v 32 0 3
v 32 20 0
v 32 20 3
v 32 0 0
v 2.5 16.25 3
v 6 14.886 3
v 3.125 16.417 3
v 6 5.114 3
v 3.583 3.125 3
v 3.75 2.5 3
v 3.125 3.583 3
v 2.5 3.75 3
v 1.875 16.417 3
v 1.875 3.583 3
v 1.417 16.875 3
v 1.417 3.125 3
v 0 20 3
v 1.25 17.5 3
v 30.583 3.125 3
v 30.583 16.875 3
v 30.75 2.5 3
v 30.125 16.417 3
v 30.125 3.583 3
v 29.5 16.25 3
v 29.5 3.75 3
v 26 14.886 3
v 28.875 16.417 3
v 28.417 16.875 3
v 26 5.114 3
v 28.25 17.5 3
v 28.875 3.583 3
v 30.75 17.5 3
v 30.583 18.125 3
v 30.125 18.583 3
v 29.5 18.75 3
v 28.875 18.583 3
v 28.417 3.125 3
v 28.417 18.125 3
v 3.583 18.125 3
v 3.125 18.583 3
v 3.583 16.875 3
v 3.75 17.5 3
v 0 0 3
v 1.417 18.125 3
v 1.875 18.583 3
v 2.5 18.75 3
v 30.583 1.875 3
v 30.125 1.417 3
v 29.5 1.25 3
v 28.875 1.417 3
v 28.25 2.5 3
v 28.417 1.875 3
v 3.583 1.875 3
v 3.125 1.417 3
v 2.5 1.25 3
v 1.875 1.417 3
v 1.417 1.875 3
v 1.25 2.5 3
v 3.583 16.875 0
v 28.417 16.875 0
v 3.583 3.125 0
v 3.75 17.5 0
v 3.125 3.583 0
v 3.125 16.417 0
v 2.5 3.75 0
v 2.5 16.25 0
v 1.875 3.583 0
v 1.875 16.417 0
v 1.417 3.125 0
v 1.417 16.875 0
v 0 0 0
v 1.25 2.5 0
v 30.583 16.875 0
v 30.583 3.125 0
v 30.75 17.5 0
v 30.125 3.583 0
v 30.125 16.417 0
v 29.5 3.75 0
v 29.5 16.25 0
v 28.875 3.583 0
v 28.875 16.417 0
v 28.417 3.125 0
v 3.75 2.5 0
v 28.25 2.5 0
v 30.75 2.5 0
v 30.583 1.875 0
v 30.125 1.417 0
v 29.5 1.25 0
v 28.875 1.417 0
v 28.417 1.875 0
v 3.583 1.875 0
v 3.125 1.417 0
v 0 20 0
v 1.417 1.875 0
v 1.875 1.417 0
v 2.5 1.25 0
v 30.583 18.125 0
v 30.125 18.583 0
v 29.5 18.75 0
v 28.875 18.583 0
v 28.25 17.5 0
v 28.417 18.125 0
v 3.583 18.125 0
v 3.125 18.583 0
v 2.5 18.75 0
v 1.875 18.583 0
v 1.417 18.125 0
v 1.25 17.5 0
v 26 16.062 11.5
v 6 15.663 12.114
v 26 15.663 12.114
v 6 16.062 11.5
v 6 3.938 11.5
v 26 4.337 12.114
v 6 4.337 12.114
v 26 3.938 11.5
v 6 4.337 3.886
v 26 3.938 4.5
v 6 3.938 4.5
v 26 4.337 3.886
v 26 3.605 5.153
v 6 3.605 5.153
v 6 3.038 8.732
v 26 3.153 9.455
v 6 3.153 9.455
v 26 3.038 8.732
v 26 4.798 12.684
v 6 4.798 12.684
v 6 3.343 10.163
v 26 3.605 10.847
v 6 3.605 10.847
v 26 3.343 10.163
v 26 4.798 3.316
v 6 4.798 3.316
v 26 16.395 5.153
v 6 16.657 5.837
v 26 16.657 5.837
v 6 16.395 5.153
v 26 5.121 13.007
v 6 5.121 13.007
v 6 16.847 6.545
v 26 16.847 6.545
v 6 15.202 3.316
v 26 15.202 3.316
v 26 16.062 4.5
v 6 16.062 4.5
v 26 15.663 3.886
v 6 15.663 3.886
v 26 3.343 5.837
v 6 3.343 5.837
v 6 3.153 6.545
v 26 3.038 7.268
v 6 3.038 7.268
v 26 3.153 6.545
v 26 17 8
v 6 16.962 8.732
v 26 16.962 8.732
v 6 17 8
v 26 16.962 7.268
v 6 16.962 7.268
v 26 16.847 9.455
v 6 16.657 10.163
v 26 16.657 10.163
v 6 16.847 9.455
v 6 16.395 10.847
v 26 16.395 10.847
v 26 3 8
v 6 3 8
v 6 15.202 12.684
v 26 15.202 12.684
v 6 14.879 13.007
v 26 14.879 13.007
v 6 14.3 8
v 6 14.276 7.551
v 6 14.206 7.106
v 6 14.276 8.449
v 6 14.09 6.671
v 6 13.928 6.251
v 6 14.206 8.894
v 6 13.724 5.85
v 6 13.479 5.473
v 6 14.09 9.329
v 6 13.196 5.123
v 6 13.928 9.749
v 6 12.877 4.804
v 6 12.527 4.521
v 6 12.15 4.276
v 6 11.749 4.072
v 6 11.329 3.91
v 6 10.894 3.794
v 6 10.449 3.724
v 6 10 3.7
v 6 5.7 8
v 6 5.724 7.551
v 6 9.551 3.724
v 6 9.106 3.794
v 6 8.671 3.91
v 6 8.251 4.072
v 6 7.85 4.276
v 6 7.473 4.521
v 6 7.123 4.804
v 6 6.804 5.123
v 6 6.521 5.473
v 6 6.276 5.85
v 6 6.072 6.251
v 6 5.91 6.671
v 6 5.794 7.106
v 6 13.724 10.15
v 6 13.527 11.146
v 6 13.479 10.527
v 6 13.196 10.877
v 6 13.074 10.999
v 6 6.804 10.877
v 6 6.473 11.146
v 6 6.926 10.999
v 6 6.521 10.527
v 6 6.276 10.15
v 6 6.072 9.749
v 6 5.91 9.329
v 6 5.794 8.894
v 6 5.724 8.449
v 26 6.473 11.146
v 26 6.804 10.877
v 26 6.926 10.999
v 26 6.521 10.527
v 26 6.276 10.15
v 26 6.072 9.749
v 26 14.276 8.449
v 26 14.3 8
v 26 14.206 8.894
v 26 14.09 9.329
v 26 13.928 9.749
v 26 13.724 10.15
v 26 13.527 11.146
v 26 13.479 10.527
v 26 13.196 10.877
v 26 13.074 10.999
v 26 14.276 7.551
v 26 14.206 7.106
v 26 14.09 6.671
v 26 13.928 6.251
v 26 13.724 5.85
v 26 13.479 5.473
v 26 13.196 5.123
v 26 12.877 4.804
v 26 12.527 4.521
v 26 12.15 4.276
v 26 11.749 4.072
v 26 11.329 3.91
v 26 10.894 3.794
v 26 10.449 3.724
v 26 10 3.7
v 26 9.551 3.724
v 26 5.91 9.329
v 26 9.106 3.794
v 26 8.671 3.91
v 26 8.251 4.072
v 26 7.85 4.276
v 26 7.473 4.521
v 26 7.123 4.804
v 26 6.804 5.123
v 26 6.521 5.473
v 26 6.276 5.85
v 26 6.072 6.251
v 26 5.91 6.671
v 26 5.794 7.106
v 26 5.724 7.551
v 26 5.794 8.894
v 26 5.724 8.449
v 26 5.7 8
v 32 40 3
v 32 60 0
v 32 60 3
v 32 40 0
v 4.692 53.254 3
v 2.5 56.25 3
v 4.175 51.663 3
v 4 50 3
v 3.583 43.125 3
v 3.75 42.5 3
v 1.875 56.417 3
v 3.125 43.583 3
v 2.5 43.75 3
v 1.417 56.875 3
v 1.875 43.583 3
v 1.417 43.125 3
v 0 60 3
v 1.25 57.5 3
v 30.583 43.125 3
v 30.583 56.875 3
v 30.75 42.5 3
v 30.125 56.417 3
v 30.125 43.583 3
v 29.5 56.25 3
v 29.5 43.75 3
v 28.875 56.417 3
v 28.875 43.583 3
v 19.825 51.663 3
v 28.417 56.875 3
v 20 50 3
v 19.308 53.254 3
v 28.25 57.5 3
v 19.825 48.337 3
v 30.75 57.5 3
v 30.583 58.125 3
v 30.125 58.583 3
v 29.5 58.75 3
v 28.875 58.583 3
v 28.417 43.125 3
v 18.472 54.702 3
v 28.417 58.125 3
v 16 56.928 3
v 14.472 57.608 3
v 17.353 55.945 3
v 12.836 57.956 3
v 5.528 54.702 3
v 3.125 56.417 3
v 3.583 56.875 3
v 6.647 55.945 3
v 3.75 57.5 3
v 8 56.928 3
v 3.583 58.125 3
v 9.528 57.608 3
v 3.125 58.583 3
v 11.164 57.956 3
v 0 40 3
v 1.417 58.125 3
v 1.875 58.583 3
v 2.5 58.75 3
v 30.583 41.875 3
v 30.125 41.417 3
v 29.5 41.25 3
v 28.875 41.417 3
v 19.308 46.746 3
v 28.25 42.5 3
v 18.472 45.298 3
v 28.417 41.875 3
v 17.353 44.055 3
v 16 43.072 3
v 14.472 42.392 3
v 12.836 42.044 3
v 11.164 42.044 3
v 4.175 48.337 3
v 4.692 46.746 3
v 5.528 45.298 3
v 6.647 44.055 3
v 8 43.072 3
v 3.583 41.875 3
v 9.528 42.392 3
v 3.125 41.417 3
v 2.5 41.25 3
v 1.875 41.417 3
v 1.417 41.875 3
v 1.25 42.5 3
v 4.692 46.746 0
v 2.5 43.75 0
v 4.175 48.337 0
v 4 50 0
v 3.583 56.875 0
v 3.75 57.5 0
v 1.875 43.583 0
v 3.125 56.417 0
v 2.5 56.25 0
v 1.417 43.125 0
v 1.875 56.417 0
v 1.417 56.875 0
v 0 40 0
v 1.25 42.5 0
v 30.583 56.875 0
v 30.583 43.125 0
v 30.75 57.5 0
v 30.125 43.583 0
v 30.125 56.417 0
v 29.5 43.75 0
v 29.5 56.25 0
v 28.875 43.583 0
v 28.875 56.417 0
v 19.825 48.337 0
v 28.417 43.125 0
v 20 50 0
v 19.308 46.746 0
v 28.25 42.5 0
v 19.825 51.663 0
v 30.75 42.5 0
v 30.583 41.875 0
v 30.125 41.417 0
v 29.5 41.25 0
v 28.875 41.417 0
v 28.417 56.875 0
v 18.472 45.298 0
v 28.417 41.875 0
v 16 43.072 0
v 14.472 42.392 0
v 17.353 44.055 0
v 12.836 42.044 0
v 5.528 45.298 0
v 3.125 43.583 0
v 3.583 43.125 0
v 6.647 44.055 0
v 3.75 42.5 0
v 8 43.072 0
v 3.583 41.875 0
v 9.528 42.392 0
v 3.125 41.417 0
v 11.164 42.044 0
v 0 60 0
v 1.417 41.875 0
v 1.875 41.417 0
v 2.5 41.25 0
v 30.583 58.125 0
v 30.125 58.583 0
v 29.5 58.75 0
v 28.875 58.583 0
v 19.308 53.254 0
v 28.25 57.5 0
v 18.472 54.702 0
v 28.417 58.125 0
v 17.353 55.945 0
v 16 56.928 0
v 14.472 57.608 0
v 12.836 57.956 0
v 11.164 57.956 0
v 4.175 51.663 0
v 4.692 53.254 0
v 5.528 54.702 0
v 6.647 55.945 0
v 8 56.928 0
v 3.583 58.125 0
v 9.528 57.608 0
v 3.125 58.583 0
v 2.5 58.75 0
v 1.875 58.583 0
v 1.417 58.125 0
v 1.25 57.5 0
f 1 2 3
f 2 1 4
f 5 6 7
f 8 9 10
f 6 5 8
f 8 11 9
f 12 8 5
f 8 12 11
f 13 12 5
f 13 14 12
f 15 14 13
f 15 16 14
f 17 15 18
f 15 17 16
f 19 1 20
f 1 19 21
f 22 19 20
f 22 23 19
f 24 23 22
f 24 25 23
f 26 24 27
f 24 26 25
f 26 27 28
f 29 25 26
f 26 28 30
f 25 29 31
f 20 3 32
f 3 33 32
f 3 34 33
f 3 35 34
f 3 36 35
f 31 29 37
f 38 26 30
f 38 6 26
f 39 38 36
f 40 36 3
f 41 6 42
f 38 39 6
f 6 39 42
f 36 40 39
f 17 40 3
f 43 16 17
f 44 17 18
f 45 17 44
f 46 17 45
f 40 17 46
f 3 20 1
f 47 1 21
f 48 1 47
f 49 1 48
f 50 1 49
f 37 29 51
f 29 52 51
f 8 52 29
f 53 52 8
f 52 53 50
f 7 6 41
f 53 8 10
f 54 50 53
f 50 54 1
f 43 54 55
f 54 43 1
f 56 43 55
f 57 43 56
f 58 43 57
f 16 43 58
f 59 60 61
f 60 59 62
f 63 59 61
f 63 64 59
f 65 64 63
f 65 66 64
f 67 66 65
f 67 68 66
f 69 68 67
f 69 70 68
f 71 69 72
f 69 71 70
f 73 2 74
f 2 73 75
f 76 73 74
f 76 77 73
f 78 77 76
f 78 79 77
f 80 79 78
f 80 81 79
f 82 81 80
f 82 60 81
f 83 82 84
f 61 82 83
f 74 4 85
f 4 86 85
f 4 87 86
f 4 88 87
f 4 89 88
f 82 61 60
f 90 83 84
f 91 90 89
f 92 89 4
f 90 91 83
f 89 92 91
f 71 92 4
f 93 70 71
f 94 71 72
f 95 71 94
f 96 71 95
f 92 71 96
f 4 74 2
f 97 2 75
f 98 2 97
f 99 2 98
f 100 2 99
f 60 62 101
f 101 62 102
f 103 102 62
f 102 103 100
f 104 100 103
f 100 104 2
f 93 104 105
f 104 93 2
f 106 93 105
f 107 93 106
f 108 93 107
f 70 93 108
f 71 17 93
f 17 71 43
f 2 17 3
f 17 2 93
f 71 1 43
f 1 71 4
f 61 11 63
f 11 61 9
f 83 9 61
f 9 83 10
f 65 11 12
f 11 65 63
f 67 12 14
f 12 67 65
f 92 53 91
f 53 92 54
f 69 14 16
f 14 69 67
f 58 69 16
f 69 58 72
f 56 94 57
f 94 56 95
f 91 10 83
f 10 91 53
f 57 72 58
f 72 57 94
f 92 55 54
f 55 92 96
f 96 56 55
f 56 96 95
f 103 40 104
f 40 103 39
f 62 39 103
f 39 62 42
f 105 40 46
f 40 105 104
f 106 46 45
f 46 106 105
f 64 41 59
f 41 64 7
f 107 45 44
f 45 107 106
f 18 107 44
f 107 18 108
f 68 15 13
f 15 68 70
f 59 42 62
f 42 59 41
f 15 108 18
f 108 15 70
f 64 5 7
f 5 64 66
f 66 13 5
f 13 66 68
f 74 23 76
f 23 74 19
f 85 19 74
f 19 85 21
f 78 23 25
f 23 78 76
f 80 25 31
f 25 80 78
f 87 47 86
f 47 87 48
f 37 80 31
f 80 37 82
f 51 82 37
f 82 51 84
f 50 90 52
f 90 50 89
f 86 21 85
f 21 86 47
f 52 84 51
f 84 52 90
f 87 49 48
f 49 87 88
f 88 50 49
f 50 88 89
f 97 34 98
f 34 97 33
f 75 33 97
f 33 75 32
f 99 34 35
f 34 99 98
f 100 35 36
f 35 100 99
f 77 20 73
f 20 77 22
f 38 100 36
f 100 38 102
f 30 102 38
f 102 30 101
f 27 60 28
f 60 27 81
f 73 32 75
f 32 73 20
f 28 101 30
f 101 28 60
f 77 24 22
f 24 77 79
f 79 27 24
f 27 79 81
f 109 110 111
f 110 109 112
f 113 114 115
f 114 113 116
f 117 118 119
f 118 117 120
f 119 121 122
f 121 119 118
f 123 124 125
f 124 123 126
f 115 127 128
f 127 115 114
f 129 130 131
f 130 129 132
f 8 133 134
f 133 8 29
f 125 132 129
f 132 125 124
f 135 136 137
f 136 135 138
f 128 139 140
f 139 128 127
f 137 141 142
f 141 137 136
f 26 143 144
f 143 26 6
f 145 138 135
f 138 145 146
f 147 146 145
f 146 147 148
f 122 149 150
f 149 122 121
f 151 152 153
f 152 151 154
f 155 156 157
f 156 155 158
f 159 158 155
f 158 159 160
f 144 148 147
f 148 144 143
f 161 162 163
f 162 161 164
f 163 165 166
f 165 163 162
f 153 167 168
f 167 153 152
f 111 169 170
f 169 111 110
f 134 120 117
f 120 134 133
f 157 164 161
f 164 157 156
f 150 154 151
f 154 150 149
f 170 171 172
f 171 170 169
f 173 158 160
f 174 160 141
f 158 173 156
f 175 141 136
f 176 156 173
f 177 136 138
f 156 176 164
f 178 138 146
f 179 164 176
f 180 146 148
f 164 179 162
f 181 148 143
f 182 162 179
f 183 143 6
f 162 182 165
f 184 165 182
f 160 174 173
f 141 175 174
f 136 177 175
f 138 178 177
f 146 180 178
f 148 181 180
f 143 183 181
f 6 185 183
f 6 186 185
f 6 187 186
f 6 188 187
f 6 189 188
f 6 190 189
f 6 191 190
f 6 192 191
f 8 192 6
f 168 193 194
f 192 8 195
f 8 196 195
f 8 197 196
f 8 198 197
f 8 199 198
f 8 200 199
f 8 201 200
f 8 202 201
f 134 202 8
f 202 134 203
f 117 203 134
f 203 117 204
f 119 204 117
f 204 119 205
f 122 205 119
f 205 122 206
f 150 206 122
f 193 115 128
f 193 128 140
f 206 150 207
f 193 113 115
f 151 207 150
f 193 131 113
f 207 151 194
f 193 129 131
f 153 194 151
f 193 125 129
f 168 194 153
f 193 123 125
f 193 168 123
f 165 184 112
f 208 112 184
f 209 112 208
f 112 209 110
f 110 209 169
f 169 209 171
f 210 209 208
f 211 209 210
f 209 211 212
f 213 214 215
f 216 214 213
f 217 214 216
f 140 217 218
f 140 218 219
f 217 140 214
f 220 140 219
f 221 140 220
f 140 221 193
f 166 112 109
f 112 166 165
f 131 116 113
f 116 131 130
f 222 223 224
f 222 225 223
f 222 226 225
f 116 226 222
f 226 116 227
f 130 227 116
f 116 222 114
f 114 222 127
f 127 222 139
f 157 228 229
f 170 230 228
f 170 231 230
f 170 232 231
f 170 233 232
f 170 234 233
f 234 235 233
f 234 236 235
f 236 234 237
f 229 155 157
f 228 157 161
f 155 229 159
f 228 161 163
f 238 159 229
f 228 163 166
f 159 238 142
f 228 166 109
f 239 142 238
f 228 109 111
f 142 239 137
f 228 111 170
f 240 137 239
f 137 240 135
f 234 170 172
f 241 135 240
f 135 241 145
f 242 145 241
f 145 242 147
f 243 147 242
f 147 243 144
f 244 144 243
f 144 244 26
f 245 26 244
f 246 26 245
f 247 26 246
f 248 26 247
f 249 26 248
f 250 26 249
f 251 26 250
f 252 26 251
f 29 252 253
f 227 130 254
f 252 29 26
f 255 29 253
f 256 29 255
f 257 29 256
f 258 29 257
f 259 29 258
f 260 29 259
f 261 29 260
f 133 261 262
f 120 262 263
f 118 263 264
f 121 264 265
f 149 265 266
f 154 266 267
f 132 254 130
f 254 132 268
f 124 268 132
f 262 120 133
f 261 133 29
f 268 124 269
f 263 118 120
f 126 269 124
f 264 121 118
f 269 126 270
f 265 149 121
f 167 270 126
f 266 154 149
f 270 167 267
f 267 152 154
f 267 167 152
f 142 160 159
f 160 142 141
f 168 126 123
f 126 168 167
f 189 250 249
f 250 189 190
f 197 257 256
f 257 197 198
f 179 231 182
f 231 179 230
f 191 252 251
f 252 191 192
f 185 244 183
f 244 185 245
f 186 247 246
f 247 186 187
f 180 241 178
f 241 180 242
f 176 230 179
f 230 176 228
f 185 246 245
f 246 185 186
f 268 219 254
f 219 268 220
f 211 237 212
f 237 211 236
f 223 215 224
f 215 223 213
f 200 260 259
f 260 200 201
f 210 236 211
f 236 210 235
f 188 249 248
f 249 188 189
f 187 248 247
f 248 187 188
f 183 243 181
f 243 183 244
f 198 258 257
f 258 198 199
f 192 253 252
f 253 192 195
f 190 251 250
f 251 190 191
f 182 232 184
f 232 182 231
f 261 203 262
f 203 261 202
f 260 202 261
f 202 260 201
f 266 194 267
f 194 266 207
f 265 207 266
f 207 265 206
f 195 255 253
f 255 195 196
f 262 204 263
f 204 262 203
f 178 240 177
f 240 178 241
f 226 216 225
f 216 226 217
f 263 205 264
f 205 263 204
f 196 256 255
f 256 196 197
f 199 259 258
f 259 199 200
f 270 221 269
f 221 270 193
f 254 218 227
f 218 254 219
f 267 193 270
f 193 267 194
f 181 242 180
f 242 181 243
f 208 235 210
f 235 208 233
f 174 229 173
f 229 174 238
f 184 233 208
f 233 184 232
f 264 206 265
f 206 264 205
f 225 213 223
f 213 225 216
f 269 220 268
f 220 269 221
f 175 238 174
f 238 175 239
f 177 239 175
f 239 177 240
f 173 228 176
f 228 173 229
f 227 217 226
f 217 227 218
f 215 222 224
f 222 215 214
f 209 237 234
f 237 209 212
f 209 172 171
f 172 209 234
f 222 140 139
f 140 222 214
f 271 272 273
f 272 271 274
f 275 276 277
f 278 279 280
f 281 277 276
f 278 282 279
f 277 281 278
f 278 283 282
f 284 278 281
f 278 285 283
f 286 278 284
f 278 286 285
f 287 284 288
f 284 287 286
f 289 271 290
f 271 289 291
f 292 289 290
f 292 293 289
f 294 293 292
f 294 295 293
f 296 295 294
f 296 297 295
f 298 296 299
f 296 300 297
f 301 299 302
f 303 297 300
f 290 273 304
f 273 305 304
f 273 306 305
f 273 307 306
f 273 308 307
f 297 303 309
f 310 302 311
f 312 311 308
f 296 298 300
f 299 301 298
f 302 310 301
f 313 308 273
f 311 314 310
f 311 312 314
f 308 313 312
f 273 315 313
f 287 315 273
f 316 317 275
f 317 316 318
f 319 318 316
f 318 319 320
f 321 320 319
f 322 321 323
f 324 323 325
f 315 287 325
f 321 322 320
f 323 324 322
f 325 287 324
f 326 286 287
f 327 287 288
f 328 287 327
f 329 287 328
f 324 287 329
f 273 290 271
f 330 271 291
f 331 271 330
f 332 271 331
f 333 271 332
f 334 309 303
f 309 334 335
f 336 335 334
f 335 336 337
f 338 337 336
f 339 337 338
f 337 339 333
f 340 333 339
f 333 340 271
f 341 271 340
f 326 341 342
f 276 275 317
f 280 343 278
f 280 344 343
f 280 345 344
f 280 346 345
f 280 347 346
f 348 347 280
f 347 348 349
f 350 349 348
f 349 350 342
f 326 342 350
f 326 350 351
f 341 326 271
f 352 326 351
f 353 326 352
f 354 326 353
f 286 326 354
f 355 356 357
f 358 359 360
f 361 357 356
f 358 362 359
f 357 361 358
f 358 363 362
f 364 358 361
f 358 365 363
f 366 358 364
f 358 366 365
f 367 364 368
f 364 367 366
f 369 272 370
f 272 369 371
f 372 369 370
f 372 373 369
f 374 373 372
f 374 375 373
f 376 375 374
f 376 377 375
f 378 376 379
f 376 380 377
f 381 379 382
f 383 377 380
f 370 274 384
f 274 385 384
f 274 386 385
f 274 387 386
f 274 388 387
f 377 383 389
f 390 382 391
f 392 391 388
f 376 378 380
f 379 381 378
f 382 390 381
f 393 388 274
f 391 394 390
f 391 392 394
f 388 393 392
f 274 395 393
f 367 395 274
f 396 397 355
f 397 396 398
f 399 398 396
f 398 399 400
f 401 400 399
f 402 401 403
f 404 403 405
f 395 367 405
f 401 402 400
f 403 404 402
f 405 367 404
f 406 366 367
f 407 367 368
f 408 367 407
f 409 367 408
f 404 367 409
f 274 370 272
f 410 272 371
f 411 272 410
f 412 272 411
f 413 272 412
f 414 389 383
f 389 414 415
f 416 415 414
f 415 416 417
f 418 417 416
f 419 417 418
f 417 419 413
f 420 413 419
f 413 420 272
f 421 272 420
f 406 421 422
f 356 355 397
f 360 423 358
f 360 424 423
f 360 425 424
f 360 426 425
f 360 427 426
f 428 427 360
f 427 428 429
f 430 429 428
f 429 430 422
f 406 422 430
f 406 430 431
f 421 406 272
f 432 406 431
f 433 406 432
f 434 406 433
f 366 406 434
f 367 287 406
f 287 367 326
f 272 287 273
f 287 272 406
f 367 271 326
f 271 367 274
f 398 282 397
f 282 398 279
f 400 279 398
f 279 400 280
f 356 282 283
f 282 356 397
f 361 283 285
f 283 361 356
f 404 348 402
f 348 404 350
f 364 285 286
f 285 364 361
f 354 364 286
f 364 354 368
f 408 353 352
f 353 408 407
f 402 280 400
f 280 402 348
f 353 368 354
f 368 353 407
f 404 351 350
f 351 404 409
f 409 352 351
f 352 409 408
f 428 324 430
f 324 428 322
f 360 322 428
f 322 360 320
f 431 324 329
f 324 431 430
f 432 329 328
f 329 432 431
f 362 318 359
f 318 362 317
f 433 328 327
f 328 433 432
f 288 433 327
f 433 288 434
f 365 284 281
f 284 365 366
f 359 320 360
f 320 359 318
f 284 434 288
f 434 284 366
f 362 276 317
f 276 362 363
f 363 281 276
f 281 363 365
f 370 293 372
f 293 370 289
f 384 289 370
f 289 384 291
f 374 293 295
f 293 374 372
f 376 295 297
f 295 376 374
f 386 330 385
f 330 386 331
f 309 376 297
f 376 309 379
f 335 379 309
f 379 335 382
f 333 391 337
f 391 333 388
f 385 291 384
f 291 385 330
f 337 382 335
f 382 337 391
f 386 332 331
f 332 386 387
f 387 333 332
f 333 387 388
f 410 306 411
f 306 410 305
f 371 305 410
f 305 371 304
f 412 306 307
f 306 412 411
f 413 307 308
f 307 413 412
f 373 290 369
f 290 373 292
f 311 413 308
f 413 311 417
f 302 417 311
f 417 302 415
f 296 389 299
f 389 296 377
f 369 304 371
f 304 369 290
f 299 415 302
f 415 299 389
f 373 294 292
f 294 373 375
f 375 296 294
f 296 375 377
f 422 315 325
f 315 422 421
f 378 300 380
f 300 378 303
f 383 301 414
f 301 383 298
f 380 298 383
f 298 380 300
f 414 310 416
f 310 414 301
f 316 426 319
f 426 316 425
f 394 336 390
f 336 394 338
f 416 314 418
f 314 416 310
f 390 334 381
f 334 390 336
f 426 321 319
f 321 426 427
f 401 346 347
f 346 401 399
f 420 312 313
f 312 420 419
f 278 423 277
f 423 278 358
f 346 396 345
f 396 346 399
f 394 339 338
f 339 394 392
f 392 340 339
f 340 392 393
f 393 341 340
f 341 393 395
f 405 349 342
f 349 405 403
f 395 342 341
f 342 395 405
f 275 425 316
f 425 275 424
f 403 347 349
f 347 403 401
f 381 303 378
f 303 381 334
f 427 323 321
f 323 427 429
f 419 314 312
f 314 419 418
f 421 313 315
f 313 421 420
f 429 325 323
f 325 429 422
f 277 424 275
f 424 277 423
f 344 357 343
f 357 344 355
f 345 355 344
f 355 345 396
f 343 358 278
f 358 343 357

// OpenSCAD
difference(){
    cube([32,20,3]);
    translate([2.5,2.5,0])
    cylinder(d=2.5,h=4,$fn=12);
    translate([2.5,17.5,0])
    cylinder(d=2.5,h=4,$fn=12);
    translate([29.5,2.5,0])
    cylinder(d=2.5,h=4,$fn=12);
    translate([29.5,17.5,0])
    cylinder(d=2.5,h=4,$fn=12);
}
difference(){
translate([6,10,8])rotate([0,90,0])
    cylinder(d=14,h=20,$fn=60);
translate([5,10,8])rotate([0,90,0])
    cylinder(d=8.6,h=22,$fn=60);
translate([5,10,16])rotate([0,90,0])
    cylinder(d=12,h=22,$fn=10);
}

translate([0,40,0])
difference(){
    cube([32,20,3]);
    translate([2.5,2.5,0])
    cylinder(d=2.5,h=4,$fn=12);
    translate([2.5,17.5,0])
    cylinder(d=2.5,h=4,$fn=12);
    translate([29.5,2.5,0])
    cylinder(d=2.5,h=4,$fn=12);
    translate([29.5,17.5,0])
    cylinder(d=2.5,h=4,$fn=12);
    translate([12,10,0])
    cylinder(d=16,h=4,$fn=30);
}
